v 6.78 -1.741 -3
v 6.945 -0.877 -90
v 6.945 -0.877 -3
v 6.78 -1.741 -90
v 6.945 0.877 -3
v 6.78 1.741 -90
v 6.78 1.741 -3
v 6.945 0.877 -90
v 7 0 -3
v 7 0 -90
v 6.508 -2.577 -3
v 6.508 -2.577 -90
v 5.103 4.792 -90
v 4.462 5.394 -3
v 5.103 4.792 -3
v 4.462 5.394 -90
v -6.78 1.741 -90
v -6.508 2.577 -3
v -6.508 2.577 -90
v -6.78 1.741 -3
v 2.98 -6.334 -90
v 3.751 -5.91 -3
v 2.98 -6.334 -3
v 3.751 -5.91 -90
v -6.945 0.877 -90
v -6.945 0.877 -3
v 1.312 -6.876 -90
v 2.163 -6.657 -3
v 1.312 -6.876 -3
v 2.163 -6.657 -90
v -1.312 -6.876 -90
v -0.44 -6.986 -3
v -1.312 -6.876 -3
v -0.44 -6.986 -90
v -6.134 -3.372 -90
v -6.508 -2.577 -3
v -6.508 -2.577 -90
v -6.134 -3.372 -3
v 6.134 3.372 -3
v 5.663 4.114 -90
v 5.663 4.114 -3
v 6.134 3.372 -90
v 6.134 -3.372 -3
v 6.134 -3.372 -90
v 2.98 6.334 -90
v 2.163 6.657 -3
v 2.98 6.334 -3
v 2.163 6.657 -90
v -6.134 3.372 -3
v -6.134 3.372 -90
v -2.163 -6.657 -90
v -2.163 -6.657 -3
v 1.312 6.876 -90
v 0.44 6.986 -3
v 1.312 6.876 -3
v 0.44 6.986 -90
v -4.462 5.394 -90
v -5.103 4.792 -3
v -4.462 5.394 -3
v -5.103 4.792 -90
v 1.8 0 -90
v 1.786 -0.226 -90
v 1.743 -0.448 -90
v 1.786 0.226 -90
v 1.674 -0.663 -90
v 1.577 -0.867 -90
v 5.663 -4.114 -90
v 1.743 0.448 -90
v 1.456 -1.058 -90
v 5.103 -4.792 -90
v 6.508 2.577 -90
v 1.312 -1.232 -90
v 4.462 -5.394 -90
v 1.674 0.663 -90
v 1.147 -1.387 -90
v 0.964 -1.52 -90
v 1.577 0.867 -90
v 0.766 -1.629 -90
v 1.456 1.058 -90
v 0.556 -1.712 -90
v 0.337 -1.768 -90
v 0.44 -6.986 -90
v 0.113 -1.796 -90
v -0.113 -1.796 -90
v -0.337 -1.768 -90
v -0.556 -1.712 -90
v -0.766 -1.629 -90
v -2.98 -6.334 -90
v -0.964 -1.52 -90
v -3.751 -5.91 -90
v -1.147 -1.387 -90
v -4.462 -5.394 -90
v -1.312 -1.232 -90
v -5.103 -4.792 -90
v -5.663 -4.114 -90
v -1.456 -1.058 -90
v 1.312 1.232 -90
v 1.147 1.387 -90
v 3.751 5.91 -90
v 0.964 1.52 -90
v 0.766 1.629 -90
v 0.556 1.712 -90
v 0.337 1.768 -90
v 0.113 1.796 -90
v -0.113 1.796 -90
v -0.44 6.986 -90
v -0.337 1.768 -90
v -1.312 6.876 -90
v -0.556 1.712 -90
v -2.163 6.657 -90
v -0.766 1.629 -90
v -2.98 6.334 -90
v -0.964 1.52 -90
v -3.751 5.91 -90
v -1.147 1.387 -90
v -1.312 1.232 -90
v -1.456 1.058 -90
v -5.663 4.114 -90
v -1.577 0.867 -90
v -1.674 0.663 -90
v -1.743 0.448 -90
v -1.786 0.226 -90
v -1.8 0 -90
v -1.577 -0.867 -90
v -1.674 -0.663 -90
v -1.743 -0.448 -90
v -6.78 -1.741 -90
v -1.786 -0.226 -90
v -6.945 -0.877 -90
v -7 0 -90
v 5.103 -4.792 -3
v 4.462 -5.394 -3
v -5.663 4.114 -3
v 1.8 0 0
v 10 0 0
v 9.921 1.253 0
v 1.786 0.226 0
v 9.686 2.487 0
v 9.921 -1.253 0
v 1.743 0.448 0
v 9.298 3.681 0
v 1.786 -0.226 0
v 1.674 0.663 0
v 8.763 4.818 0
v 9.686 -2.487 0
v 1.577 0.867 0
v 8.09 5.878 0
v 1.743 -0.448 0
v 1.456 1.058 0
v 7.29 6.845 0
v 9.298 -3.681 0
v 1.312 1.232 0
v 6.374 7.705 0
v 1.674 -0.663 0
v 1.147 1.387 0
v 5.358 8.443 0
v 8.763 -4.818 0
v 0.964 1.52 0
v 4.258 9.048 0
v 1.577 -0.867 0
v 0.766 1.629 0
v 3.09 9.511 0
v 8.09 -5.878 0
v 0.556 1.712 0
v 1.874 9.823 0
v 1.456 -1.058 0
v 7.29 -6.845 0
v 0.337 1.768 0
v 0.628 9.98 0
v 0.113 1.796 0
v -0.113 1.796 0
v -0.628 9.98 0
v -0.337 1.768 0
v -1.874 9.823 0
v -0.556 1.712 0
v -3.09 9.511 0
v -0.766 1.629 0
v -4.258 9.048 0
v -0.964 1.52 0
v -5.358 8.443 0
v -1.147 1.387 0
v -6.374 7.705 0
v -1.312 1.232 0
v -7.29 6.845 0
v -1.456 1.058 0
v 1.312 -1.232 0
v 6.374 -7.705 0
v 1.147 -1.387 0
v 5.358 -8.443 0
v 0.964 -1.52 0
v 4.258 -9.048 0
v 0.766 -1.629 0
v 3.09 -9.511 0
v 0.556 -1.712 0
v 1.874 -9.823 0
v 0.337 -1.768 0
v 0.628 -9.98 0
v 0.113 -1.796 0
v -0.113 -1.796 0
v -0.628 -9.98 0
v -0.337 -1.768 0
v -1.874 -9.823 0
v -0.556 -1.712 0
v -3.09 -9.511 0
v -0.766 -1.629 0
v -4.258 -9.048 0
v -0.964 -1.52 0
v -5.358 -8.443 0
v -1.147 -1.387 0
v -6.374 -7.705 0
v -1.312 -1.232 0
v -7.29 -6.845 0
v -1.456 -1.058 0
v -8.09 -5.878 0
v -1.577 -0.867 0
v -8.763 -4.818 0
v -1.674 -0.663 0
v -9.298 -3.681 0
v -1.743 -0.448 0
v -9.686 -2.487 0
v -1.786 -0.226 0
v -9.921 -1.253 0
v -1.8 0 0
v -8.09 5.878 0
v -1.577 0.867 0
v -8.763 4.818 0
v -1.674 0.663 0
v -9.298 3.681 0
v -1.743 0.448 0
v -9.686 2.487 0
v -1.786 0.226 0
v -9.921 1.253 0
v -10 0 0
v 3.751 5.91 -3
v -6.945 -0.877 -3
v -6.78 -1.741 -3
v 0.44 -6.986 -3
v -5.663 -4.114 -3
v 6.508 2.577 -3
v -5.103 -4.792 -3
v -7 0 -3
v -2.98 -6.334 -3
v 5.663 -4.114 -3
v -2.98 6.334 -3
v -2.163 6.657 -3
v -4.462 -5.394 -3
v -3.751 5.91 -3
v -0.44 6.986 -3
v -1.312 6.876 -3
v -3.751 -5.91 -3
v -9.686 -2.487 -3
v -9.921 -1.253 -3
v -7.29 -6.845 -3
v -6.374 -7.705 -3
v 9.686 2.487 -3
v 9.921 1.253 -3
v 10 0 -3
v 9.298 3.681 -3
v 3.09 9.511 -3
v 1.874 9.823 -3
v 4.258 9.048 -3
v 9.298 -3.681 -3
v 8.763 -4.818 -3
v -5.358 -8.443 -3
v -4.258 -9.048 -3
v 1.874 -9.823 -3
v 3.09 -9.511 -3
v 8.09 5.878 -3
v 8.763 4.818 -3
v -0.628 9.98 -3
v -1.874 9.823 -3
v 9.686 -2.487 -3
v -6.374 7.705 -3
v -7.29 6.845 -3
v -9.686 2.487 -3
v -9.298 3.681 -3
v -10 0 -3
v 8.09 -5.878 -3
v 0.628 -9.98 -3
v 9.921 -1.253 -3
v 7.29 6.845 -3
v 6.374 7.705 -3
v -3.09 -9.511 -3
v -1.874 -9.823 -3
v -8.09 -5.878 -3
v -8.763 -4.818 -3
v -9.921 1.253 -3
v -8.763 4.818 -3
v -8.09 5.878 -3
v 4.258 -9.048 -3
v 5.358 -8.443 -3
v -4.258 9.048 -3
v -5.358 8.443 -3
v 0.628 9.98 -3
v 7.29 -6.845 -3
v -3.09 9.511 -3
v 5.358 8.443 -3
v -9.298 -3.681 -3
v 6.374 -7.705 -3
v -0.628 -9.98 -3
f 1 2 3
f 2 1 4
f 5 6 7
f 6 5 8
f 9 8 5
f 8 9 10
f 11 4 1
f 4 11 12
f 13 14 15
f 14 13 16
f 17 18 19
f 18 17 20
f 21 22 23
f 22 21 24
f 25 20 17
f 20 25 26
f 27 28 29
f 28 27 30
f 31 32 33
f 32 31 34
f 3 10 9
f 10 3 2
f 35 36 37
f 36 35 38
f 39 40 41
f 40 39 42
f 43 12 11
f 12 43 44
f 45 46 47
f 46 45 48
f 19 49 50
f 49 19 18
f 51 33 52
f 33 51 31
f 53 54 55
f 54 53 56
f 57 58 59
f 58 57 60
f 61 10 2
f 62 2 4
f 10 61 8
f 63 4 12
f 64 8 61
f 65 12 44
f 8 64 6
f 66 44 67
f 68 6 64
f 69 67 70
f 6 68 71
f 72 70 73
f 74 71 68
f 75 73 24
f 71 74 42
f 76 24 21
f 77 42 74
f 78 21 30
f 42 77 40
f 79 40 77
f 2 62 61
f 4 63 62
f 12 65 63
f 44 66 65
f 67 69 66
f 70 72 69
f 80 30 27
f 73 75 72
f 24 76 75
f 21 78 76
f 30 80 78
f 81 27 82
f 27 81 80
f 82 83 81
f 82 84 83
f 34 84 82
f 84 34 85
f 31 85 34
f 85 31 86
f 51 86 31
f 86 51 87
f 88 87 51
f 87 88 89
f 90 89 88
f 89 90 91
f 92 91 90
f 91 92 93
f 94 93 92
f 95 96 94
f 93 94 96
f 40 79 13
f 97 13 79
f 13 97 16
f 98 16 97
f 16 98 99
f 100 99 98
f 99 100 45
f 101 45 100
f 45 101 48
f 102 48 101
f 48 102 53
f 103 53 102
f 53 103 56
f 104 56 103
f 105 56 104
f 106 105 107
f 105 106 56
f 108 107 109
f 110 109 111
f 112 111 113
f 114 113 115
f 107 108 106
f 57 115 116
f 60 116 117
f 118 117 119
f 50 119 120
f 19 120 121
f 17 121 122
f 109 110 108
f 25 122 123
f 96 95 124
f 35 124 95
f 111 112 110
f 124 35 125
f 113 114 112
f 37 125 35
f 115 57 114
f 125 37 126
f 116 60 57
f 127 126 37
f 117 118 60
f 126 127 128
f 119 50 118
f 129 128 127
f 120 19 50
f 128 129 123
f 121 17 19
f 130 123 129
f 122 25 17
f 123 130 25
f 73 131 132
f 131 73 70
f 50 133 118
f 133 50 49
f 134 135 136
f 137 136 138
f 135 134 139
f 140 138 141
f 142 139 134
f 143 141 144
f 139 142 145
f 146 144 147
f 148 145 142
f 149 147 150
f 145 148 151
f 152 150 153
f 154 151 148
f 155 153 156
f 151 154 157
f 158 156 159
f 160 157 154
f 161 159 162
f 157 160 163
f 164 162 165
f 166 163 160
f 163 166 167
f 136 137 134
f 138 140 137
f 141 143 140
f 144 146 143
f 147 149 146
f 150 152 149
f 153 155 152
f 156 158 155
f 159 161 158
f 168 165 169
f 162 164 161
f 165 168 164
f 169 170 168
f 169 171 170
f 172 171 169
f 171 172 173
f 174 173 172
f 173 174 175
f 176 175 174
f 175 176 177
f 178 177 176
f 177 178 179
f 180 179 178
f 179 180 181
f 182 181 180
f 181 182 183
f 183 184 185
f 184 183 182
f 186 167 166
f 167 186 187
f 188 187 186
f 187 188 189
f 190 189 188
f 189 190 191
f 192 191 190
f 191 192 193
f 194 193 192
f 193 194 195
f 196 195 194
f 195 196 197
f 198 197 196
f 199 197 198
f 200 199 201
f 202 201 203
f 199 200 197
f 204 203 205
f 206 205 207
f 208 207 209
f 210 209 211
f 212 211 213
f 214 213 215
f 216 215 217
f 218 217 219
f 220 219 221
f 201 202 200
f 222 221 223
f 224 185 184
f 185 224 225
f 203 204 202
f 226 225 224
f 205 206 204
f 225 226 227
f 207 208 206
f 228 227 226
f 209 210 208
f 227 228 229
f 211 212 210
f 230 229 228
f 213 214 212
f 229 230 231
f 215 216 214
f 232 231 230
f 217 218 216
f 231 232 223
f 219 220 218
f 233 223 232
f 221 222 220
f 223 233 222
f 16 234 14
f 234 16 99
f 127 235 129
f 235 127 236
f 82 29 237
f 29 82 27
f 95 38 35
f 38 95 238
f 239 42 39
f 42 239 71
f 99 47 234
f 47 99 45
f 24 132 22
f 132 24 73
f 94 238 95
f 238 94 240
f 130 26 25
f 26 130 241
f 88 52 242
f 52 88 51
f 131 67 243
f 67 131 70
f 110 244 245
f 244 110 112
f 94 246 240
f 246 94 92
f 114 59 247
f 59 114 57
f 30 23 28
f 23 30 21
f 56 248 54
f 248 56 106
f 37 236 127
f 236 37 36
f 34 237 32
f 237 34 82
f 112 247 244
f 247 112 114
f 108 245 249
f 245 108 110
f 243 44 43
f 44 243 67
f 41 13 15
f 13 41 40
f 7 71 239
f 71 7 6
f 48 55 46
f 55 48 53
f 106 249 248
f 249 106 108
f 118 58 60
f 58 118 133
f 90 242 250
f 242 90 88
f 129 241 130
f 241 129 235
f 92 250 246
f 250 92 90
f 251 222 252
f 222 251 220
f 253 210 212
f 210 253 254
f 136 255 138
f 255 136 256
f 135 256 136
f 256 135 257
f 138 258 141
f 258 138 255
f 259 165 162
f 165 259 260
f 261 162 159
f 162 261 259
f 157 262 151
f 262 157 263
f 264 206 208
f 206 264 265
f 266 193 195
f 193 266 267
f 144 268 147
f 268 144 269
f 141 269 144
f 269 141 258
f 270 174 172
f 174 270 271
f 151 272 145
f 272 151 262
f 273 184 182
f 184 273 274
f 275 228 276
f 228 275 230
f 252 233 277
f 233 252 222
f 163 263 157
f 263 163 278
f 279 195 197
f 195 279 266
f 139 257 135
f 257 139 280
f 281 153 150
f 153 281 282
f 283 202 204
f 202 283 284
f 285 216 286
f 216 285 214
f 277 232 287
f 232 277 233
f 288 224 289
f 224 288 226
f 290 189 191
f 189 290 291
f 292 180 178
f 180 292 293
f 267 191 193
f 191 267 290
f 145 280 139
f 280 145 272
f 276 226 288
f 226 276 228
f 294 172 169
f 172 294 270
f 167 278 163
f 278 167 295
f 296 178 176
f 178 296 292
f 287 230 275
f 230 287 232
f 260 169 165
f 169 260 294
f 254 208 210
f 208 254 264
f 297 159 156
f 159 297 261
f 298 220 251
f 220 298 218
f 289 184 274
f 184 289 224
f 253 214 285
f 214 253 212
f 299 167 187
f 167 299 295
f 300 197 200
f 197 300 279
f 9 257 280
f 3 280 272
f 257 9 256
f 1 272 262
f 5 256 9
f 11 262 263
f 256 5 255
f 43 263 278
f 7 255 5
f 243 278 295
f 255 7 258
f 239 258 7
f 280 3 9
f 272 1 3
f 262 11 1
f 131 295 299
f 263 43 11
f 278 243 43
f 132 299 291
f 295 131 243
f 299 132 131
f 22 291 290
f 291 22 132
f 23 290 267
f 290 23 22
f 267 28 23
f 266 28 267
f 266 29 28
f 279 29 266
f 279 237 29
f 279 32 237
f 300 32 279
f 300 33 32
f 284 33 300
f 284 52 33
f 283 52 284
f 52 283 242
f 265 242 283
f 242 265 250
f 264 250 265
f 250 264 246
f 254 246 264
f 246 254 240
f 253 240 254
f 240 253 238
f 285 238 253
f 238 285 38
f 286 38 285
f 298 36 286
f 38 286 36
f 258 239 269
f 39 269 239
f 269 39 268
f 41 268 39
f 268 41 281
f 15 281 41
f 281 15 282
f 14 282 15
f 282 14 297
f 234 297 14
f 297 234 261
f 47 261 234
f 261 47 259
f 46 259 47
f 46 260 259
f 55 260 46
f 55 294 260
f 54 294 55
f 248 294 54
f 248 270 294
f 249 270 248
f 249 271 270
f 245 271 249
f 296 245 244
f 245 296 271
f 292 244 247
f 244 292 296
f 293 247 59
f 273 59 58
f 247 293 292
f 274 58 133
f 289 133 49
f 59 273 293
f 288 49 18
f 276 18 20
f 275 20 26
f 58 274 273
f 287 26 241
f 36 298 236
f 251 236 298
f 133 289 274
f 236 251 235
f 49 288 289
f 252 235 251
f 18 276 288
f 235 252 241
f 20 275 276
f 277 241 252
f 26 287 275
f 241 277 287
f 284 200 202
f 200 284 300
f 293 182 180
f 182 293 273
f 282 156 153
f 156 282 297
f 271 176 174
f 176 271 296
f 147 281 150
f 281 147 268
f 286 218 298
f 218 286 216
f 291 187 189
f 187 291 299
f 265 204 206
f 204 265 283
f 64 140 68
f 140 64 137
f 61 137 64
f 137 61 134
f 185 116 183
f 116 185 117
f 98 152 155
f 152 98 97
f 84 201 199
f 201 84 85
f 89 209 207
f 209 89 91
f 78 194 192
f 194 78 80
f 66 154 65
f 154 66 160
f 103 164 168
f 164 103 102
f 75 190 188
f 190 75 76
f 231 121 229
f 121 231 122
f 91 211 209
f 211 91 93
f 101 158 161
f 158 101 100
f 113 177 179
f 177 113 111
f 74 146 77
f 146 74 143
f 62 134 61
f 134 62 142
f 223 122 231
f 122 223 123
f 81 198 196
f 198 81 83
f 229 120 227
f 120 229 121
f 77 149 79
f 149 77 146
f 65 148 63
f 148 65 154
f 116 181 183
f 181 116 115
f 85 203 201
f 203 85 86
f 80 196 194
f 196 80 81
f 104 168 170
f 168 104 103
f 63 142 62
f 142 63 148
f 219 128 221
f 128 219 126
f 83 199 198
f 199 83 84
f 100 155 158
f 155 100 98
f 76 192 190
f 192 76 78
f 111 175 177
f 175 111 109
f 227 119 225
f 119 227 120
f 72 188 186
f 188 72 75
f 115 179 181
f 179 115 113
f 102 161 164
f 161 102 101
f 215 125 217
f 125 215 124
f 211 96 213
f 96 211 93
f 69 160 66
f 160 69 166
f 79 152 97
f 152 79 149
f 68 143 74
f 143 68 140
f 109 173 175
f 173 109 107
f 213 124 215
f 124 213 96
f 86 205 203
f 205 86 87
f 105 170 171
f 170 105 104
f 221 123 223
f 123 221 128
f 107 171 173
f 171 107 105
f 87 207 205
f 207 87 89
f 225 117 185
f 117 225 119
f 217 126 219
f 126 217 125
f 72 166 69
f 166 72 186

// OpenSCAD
$fn = 50;


difference() {
	union() {
		translate(v = [0, 0, -90.0000000000]) {
			cylinder(h = 90, r = 7.0000000000);
		}
		translate(v = [0, 0, -3.0000000000]) {
			cylinder(h = 3, r = 10.0000000000);
		}
	}
	union() {
		#translate(v = [0, 0, -90]) {
			cylinder(h = 90, r = 1.8000000000);
		}
	}
}
